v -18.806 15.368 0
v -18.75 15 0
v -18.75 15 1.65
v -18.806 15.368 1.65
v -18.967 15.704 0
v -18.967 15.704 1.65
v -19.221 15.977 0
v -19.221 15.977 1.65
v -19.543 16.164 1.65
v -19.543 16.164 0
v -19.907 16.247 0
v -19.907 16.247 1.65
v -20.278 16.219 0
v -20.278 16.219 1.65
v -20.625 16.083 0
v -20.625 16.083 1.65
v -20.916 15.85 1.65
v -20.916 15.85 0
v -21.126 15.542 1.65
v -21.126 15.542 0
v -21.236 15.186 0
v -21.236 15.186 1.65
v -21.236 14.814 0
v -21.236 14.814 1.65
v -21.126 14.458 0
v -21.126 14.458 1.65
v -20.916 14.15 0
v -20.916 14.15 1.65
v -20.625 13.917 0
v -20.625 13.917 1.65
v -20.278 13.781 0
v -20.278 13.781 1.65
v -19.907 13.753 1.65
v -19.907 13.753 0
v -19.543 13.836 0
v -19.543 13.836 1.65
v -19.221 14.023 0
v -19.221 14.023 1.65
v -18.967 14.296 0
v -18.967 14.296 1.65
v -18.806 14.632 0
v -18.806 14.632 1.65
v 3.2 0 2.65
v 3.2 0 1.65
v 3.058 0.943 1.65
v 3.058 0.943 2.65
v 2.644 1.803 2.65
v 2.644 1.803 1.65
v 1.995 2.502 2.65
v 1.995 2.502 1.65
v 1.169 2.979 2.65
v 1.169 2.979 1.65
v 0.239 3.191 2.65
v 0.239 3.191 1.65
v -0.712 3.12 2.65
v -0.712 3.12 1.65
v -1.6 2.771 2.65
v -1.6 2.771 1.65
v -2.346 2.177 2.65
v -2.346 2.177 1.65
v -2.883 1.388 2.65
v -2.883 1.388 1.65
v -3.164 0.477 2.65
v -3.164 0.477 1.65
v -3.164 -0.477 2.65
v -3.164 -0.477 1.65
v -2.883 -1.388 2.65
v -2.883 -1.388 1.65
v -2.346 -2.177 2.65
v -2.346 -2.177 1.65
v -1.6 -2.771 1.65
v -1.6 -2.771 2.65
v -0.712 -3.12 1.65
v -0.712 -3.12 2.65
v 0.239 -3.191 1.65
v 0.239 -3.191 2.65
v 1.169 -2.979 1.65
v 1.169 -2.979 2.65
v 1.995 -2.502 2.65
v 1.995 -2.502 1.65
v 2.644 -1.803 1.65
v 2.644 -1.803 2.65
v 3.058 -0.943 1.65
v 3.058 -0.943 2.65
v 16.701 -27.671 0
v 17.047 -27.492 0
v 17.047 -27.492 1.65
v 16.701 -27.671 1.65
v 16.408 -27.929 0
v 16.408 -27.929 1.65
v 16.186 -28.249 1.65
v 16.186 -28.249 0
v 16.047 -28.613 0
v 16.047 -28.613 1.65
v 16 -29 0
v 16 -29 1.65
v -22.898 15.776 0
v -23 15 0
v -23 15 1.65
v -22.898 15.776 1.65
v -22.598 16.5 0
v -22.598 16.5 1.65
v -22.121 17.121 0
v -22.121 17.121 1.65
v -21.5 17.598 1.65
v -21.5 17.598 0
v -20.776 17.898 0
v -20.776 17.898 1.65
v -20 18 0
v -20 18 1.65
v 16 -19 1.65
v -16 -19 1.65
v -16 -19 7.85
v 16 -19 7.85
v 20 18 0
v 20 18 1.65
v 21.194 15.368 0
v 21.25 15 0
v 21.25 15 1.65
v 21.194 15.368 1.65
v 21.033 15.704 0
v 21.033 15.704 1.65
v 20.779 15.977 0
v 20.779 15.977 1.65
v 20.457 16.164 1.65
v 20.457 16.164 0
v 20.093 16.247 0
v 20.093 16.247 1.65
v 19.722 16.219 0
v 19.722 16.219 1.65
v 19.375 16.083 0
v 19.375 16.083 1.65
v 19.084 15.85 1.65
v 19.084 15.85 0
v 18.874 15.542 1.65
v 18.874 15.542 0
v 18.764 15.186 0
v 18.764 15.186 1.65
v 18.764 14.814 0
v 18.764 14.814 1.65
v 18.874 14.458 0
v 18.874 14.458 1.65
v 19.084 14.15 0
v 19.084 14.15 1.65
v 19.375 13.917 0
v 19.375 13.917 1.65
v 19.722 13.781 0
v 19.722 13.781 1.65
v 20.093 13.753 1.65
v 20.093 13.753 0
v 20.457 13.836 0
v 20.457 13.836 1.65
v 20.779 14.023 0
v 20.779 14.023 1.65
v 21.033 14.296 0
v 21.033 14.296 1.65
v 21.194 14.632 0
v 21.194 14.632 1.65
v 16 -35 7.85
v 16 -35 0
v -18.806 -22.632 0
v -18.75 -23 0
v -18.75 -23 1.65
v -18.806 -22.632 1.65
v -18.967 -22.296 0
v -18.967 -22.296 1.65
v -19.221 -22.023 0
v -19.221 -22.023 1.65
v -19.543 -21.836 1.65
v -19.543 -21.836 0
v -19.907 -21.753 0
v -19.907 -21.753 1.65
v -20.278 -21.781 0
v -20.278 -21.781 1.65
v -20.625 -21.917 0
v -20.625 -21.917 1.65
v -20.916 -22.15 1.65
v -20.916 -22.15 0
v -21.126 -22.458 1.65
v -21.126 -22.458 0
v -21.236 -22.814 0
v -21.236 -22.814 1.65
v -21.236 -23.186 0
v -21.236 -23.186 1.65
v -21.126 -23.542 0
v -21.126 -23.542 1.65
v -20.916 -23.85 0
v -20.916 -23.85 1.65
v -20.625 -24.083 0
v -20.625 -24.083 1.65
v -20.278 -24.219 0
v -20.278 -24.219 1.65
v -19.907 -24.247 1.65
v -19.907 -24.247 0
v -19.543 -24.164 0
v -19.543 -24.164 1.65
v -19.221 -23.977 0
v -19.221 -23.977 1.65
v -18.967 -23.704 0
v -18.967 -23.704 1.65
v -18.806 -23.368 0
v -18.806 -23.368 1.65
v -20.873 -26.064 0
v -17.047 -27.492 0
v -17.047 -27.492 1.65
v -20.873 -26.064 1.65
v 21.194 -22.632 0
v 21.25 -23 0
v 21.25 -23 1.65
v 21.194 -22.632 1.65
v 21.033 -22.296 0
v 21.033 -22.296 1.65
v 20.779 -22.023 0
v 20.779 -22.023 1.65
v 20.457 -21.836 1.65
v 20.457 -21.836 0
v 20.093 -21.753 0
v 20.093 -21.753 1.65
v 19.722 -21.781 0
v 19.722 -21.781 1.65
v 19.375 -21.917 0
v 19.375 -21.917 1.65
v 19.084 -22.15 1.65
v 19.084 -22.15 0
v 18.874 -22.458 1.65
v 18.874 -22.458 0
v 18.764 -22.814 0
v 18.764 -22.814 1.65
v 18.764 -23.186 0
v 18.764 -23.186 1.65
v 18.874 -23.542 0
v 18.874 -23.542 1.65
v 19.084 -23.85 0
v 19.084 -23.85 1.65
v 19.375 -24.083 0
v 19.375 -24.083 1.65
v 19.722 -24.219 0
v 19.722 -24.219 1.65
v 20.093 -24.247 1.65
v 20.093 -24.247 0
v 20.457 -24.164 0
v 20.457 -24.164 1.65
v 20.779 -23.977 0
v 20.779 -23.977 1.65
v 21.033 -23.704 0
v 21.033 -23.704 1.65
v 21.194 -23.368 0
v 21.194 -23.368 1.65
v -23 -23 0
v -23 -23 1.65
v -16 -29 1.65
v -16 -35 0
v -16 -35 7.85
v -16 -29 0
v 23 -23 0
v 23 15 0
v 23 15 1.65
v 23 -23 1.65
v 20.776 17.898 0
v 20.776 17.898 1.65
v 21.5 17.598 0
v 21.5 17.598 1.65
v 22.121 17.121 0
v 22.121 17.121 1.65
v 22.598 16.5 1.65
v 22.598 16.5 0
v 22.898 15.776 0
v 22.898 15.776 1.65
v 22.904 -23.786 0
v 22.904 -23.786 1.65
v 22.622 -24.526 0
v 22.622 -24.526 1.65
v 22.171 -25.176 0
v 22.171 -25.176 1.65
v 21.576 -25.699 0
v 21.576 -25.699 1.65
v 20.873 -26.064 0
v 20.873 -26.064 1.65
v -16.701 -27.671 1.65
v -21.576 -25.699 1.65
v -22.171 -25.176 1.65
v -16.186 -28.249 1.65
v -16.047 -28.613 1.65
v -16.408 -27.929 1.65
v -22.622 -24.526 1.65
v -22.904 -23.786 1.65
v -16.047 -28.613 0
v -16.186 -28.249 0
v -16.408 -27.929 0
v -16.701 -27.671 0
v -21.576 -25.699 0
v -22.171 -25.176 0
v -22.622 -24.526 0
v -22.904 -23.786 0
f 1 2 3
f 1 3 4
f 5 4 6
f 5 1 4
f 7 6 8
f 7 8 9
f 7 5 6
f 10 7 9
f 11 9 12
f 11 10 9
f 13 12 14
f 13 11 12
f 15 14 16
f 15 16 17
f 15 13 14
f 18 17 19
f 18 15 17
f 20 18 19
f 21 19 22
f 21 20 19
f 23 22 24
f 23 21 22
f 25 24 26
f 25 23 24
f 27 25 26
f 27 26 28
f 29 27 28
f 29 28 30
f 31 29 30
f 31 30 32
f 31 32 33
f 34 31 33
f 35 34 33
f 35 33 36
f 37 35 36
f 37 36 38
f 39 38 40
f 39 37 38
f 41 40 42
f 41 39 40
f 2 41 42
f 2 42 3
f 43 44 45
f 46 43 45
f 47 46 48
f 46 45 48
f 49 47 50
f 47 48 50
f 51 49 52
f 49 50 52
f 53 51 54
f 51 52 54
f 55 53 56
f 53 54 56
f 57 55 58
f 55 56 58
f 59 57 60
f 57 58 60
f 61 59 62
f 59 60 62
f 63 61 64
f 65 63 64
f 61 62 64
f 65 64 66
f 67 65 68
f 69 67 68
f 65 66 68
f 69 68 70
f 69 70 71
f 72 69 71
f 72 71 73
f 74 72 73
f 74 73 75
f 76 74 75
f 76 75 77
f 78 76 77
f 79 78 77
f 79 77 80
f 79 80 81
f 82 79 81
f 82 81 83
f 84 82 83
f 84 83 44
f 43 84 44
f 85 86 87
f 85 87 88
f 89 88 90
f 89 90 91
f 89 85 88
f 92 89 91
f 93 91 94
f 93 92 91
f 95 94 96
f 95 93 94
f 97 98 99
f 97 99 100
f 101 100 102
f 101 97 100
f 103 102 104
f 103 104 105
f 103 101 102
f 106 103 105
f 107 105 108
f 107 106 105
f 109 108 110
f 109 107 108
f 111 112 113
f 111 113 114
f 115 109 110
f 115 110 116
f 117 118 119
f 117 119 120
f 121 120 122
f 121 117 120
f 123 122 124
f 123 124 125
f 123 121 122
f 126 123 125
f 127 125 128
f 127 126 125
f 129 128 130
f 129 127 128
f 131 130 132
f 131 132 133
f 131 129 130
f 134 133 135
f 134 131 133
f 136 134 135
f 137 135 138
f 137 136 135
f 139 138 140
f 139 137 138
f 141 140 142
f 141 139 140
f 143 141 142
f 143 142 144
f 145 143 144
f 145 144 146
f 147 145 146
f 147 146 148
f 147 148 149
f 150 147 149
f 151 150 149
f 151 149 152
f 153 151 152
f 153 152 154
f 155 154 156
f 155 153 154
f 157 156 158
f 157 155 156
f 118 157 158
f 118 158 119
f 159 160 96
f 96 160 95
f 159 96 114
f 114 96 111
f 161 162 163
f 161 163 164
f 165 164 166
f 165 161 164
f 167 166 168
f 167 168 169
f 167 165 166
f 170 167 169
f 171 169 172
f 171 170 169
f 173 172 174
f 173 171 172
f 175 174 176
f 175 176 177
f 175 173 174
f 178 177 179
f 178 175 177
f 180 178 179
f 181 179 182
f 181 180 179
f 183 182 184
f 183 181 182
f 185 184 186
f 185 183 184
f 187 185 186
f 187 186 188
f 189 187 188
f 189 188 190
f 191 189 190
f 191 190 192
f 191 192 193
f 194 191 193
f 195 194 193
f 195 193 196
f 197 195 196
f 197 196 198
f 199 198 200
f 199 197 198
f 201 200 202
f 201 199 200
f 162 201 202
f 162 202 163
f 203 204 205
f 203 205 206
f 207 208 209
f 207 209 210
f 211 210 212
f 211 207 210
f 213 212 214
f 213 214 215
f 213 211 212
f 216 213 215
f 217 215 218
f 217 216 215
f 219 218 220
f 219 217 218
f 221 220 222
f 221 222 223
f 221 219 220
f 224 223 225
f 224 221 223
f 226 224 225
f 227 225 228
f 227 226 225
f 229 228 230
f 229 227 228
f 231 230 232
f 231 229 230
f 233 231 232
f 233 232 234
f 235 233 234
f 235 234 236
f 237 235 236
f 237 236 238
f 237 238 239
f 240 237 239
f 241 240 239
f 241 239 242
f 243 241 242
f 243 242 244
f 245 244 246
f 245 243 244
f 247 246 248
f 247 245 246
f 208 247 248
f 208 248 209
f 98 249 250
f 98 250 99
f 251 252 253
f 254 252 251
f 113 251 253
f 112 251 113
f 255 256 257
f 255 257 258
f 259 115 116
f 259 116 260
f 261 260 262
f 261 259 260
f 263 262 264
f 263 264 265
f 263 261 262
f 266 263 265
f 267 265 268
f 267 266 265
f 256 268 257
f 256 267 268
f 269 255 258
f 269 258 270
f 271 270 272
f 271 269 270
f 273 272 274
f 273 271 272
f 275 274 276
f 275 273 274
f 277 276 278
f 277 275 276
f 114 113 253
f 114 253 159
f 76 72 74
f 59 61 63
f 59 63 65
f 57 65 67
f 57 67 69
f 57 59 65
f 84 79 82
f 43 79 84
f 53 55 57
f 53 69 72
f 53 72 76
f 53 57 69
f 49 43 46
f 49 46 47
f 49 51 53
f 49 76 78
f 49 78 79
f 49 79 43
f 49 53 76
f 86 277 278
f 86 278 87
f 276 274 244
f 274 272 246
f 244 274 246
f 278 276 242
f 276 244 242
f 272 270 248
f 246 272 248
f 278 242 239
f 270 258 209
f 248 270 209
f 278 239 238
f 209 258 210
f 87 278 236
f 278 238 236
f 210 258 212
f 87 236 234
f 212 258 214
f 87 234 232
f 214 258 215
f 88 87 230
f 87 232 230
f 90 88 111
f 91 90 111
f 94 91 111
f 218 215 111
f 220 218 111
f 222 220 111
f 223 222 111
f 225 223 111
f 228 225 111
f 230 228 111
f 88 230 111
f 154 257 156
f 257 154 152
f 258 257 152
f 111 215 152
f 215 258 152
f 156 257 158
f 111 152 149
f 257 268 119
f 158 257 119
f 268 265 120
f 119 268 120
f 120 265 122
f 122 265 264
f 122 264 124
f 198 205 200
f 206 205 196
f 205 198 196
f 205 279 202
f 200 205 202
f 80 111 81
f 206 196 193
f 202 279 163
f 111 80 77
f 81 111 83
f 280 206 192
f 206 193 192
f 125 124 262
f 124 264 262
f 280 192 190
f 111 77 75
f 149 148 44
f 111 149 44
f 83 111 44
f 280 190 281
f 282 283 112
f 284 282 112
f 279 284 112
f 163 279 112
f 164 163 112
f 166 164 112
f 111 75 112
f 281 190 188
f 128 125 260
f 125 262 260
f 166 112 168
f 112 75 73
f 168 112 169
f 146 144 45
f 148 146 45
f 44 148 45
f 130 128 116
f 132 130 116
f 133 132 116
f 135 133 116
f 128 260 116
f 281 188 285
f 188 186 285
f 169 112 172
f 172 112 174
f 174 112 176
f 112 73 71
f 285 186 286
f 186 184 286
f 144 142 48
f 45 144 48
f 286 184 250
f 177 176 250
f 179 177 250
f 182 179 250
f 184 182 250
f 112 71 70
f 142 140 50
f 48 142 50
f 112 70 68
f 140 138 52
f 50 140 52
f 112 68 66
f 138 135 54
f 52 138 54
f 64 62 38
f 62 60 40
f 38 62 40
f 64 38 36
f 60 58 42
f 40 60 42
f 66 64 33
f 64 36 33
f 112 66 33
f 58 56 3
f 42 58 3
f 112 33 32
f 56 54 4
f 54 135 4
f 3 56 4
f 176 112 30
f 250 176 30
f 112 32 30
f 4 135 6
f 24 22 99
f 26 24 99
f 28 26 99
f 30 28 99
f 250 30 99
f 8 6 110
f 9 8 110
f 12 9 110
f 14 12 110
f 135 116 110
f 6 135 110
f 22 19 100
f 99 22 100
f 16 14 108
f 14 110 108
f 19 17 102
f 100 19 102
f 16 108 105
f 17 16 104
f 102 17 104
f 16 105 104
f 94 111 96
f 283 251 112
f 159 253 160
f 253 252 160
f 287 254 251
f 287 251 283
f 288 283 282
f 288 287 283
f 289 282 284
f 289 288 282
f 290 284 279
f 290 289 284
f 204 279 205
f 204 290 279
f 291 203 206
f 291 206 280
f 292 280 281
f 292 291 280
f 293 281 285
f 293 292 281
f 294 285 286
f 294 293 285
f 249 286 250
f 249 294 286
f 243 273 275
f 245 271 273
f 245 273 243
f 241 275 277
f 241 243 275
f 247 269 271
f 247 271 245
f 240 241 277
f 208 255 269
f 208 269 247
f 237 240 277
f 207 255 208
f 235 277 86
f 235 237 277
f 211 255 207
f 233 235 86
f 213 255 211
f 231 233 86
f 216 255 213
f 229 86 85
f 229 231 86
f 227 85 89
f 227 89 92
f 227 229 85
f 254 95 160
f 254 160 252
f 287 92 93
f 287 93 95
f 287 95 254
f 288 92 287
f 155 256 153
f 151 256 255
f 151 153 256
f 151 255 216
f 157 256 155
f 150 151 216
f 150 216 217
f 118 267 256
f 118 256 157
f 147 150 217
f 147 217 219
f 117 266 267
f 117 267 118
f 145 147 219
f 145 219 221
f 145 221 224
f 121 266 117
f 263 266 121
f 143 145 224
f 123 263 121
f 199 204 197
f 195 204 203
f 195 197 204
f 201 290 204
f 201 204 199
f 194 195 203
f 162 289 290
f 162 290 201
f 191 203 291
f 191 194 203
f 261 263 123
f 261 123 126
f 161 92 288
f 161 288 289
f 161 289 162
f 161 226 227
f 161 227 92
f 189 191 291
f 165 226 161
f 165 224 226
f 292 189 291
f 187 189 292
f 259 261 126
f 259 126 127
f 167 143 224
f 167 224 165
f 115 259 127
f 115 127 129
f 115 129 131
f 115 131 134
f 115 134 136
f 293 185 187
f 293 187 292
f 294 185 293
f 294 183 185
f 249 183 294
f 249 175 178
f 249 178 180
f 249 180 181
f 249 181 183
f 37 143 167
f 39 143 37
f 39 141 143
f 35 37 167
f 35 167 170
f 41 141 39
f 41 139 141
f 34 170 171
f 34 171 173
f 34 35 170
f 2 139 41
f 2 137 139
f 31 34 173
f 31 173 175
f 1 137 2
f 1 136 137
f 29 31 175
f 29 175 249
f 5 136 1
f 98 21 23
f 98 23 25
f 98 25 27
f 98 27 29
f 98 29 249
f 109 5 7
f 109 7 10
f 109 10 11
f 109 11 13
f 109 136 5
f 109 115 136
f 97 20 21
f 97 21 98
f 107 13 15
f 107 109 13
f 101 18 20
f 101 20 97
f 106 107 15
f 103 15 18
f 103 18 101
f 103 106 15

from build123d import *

# Parameters (mm, degrees)
SKETCH1_R           = 3.2
SKETCH1_R_2         = 1.25
BOSS_EXTRUDE1_DEPTH = 1.65
SKETCH2_W           = 32
SKETCH2_H           = 16
BOSS_EXTRUDE2_DEPTH = 6.2
SKETCH1_2_R         = 3.2
BOSS_EXTRUDE3_DEPTH = 2.65


with BuildPart() as part:
    # Sketch1 → Boss-Extrude1 (new body)
    with BuildSketch(Plane.XY):
        with BuildLine():
            Line((-20, 18), (20, 18))
            ThreePointArc((20, 18), (22.121320344, 17.121320344), (23, 15))
            Line((23, 15), (23, -23))
            ThreePointArc((23, -23), (22.416236427, -24.864680631), (20.873373788, -26.063592072))
            Line((20.873373788, -26.063592072), (17.047054496, -27.491625922))
            ThreePointArc((17.047054496, -27.491625922), (16.287418762, -28.081915652), (16, -29))
            Line((16, -29), (16, -35))
            Line((16, -35), (-16, -35))
            Line((-16, -35), (-16, -29))
            ThreePointArc((-16, -29), (-16.287418762, -28.081915652), (-17.047054496, -27.491625922))
            Line((-17.047054496, -27.491625922), (-20.873373788, -26.063592072))
            ThreePointArc((-20.873373788, -26.063592072), (-22.416236427, -24.864680631), (-23, -23))
            Line((-23, -23), (-23, 15))
            ThreePointArc((-23, 15), (-22.121320344, 17.121320344), (-20, 18))
        make_face()
        Circle(SKETCH1_R, mode=Mode.SUBTRACT)
        with Locations((20, 15)):
            Circle(SKETCH1_R_2, mode=Mode.SUBTRACT)
        with Locations((-20, 15)):
            Circle(SKETCH1_R_2, mode=Mode.SUBTRACT)
        with Locations((-20, -23)):
            Circle(SKETCH1_R_2, mode=Mode.SUBTRACT)
        with Locations((20, -23)):
            Circle(SKETCH1_R_2, mode=Mode.SUBTRACT)
    extrude(amount=BOSS_EXTRUDE1_DEPTH)

    # Sketch2 → Boss-Extrude2 (add)
    with BuildSketch(Plane.XY.offset(1.65)):
        with Locations((0, -27)):
            Rectangle(SKETCH2_W, SKETCH2_H)
    extrude(amount=BOSS_EXTRUDE2_DEPTH)

    # Sketch1<2> → Boss-Extrude3 (add)
    with BuildSketch(Plane.XY):
        Circle(SKETCH1_2_R)
    extrude(amount=BOSS_EXTRUDE3_DEPTH)


solid = part.part
